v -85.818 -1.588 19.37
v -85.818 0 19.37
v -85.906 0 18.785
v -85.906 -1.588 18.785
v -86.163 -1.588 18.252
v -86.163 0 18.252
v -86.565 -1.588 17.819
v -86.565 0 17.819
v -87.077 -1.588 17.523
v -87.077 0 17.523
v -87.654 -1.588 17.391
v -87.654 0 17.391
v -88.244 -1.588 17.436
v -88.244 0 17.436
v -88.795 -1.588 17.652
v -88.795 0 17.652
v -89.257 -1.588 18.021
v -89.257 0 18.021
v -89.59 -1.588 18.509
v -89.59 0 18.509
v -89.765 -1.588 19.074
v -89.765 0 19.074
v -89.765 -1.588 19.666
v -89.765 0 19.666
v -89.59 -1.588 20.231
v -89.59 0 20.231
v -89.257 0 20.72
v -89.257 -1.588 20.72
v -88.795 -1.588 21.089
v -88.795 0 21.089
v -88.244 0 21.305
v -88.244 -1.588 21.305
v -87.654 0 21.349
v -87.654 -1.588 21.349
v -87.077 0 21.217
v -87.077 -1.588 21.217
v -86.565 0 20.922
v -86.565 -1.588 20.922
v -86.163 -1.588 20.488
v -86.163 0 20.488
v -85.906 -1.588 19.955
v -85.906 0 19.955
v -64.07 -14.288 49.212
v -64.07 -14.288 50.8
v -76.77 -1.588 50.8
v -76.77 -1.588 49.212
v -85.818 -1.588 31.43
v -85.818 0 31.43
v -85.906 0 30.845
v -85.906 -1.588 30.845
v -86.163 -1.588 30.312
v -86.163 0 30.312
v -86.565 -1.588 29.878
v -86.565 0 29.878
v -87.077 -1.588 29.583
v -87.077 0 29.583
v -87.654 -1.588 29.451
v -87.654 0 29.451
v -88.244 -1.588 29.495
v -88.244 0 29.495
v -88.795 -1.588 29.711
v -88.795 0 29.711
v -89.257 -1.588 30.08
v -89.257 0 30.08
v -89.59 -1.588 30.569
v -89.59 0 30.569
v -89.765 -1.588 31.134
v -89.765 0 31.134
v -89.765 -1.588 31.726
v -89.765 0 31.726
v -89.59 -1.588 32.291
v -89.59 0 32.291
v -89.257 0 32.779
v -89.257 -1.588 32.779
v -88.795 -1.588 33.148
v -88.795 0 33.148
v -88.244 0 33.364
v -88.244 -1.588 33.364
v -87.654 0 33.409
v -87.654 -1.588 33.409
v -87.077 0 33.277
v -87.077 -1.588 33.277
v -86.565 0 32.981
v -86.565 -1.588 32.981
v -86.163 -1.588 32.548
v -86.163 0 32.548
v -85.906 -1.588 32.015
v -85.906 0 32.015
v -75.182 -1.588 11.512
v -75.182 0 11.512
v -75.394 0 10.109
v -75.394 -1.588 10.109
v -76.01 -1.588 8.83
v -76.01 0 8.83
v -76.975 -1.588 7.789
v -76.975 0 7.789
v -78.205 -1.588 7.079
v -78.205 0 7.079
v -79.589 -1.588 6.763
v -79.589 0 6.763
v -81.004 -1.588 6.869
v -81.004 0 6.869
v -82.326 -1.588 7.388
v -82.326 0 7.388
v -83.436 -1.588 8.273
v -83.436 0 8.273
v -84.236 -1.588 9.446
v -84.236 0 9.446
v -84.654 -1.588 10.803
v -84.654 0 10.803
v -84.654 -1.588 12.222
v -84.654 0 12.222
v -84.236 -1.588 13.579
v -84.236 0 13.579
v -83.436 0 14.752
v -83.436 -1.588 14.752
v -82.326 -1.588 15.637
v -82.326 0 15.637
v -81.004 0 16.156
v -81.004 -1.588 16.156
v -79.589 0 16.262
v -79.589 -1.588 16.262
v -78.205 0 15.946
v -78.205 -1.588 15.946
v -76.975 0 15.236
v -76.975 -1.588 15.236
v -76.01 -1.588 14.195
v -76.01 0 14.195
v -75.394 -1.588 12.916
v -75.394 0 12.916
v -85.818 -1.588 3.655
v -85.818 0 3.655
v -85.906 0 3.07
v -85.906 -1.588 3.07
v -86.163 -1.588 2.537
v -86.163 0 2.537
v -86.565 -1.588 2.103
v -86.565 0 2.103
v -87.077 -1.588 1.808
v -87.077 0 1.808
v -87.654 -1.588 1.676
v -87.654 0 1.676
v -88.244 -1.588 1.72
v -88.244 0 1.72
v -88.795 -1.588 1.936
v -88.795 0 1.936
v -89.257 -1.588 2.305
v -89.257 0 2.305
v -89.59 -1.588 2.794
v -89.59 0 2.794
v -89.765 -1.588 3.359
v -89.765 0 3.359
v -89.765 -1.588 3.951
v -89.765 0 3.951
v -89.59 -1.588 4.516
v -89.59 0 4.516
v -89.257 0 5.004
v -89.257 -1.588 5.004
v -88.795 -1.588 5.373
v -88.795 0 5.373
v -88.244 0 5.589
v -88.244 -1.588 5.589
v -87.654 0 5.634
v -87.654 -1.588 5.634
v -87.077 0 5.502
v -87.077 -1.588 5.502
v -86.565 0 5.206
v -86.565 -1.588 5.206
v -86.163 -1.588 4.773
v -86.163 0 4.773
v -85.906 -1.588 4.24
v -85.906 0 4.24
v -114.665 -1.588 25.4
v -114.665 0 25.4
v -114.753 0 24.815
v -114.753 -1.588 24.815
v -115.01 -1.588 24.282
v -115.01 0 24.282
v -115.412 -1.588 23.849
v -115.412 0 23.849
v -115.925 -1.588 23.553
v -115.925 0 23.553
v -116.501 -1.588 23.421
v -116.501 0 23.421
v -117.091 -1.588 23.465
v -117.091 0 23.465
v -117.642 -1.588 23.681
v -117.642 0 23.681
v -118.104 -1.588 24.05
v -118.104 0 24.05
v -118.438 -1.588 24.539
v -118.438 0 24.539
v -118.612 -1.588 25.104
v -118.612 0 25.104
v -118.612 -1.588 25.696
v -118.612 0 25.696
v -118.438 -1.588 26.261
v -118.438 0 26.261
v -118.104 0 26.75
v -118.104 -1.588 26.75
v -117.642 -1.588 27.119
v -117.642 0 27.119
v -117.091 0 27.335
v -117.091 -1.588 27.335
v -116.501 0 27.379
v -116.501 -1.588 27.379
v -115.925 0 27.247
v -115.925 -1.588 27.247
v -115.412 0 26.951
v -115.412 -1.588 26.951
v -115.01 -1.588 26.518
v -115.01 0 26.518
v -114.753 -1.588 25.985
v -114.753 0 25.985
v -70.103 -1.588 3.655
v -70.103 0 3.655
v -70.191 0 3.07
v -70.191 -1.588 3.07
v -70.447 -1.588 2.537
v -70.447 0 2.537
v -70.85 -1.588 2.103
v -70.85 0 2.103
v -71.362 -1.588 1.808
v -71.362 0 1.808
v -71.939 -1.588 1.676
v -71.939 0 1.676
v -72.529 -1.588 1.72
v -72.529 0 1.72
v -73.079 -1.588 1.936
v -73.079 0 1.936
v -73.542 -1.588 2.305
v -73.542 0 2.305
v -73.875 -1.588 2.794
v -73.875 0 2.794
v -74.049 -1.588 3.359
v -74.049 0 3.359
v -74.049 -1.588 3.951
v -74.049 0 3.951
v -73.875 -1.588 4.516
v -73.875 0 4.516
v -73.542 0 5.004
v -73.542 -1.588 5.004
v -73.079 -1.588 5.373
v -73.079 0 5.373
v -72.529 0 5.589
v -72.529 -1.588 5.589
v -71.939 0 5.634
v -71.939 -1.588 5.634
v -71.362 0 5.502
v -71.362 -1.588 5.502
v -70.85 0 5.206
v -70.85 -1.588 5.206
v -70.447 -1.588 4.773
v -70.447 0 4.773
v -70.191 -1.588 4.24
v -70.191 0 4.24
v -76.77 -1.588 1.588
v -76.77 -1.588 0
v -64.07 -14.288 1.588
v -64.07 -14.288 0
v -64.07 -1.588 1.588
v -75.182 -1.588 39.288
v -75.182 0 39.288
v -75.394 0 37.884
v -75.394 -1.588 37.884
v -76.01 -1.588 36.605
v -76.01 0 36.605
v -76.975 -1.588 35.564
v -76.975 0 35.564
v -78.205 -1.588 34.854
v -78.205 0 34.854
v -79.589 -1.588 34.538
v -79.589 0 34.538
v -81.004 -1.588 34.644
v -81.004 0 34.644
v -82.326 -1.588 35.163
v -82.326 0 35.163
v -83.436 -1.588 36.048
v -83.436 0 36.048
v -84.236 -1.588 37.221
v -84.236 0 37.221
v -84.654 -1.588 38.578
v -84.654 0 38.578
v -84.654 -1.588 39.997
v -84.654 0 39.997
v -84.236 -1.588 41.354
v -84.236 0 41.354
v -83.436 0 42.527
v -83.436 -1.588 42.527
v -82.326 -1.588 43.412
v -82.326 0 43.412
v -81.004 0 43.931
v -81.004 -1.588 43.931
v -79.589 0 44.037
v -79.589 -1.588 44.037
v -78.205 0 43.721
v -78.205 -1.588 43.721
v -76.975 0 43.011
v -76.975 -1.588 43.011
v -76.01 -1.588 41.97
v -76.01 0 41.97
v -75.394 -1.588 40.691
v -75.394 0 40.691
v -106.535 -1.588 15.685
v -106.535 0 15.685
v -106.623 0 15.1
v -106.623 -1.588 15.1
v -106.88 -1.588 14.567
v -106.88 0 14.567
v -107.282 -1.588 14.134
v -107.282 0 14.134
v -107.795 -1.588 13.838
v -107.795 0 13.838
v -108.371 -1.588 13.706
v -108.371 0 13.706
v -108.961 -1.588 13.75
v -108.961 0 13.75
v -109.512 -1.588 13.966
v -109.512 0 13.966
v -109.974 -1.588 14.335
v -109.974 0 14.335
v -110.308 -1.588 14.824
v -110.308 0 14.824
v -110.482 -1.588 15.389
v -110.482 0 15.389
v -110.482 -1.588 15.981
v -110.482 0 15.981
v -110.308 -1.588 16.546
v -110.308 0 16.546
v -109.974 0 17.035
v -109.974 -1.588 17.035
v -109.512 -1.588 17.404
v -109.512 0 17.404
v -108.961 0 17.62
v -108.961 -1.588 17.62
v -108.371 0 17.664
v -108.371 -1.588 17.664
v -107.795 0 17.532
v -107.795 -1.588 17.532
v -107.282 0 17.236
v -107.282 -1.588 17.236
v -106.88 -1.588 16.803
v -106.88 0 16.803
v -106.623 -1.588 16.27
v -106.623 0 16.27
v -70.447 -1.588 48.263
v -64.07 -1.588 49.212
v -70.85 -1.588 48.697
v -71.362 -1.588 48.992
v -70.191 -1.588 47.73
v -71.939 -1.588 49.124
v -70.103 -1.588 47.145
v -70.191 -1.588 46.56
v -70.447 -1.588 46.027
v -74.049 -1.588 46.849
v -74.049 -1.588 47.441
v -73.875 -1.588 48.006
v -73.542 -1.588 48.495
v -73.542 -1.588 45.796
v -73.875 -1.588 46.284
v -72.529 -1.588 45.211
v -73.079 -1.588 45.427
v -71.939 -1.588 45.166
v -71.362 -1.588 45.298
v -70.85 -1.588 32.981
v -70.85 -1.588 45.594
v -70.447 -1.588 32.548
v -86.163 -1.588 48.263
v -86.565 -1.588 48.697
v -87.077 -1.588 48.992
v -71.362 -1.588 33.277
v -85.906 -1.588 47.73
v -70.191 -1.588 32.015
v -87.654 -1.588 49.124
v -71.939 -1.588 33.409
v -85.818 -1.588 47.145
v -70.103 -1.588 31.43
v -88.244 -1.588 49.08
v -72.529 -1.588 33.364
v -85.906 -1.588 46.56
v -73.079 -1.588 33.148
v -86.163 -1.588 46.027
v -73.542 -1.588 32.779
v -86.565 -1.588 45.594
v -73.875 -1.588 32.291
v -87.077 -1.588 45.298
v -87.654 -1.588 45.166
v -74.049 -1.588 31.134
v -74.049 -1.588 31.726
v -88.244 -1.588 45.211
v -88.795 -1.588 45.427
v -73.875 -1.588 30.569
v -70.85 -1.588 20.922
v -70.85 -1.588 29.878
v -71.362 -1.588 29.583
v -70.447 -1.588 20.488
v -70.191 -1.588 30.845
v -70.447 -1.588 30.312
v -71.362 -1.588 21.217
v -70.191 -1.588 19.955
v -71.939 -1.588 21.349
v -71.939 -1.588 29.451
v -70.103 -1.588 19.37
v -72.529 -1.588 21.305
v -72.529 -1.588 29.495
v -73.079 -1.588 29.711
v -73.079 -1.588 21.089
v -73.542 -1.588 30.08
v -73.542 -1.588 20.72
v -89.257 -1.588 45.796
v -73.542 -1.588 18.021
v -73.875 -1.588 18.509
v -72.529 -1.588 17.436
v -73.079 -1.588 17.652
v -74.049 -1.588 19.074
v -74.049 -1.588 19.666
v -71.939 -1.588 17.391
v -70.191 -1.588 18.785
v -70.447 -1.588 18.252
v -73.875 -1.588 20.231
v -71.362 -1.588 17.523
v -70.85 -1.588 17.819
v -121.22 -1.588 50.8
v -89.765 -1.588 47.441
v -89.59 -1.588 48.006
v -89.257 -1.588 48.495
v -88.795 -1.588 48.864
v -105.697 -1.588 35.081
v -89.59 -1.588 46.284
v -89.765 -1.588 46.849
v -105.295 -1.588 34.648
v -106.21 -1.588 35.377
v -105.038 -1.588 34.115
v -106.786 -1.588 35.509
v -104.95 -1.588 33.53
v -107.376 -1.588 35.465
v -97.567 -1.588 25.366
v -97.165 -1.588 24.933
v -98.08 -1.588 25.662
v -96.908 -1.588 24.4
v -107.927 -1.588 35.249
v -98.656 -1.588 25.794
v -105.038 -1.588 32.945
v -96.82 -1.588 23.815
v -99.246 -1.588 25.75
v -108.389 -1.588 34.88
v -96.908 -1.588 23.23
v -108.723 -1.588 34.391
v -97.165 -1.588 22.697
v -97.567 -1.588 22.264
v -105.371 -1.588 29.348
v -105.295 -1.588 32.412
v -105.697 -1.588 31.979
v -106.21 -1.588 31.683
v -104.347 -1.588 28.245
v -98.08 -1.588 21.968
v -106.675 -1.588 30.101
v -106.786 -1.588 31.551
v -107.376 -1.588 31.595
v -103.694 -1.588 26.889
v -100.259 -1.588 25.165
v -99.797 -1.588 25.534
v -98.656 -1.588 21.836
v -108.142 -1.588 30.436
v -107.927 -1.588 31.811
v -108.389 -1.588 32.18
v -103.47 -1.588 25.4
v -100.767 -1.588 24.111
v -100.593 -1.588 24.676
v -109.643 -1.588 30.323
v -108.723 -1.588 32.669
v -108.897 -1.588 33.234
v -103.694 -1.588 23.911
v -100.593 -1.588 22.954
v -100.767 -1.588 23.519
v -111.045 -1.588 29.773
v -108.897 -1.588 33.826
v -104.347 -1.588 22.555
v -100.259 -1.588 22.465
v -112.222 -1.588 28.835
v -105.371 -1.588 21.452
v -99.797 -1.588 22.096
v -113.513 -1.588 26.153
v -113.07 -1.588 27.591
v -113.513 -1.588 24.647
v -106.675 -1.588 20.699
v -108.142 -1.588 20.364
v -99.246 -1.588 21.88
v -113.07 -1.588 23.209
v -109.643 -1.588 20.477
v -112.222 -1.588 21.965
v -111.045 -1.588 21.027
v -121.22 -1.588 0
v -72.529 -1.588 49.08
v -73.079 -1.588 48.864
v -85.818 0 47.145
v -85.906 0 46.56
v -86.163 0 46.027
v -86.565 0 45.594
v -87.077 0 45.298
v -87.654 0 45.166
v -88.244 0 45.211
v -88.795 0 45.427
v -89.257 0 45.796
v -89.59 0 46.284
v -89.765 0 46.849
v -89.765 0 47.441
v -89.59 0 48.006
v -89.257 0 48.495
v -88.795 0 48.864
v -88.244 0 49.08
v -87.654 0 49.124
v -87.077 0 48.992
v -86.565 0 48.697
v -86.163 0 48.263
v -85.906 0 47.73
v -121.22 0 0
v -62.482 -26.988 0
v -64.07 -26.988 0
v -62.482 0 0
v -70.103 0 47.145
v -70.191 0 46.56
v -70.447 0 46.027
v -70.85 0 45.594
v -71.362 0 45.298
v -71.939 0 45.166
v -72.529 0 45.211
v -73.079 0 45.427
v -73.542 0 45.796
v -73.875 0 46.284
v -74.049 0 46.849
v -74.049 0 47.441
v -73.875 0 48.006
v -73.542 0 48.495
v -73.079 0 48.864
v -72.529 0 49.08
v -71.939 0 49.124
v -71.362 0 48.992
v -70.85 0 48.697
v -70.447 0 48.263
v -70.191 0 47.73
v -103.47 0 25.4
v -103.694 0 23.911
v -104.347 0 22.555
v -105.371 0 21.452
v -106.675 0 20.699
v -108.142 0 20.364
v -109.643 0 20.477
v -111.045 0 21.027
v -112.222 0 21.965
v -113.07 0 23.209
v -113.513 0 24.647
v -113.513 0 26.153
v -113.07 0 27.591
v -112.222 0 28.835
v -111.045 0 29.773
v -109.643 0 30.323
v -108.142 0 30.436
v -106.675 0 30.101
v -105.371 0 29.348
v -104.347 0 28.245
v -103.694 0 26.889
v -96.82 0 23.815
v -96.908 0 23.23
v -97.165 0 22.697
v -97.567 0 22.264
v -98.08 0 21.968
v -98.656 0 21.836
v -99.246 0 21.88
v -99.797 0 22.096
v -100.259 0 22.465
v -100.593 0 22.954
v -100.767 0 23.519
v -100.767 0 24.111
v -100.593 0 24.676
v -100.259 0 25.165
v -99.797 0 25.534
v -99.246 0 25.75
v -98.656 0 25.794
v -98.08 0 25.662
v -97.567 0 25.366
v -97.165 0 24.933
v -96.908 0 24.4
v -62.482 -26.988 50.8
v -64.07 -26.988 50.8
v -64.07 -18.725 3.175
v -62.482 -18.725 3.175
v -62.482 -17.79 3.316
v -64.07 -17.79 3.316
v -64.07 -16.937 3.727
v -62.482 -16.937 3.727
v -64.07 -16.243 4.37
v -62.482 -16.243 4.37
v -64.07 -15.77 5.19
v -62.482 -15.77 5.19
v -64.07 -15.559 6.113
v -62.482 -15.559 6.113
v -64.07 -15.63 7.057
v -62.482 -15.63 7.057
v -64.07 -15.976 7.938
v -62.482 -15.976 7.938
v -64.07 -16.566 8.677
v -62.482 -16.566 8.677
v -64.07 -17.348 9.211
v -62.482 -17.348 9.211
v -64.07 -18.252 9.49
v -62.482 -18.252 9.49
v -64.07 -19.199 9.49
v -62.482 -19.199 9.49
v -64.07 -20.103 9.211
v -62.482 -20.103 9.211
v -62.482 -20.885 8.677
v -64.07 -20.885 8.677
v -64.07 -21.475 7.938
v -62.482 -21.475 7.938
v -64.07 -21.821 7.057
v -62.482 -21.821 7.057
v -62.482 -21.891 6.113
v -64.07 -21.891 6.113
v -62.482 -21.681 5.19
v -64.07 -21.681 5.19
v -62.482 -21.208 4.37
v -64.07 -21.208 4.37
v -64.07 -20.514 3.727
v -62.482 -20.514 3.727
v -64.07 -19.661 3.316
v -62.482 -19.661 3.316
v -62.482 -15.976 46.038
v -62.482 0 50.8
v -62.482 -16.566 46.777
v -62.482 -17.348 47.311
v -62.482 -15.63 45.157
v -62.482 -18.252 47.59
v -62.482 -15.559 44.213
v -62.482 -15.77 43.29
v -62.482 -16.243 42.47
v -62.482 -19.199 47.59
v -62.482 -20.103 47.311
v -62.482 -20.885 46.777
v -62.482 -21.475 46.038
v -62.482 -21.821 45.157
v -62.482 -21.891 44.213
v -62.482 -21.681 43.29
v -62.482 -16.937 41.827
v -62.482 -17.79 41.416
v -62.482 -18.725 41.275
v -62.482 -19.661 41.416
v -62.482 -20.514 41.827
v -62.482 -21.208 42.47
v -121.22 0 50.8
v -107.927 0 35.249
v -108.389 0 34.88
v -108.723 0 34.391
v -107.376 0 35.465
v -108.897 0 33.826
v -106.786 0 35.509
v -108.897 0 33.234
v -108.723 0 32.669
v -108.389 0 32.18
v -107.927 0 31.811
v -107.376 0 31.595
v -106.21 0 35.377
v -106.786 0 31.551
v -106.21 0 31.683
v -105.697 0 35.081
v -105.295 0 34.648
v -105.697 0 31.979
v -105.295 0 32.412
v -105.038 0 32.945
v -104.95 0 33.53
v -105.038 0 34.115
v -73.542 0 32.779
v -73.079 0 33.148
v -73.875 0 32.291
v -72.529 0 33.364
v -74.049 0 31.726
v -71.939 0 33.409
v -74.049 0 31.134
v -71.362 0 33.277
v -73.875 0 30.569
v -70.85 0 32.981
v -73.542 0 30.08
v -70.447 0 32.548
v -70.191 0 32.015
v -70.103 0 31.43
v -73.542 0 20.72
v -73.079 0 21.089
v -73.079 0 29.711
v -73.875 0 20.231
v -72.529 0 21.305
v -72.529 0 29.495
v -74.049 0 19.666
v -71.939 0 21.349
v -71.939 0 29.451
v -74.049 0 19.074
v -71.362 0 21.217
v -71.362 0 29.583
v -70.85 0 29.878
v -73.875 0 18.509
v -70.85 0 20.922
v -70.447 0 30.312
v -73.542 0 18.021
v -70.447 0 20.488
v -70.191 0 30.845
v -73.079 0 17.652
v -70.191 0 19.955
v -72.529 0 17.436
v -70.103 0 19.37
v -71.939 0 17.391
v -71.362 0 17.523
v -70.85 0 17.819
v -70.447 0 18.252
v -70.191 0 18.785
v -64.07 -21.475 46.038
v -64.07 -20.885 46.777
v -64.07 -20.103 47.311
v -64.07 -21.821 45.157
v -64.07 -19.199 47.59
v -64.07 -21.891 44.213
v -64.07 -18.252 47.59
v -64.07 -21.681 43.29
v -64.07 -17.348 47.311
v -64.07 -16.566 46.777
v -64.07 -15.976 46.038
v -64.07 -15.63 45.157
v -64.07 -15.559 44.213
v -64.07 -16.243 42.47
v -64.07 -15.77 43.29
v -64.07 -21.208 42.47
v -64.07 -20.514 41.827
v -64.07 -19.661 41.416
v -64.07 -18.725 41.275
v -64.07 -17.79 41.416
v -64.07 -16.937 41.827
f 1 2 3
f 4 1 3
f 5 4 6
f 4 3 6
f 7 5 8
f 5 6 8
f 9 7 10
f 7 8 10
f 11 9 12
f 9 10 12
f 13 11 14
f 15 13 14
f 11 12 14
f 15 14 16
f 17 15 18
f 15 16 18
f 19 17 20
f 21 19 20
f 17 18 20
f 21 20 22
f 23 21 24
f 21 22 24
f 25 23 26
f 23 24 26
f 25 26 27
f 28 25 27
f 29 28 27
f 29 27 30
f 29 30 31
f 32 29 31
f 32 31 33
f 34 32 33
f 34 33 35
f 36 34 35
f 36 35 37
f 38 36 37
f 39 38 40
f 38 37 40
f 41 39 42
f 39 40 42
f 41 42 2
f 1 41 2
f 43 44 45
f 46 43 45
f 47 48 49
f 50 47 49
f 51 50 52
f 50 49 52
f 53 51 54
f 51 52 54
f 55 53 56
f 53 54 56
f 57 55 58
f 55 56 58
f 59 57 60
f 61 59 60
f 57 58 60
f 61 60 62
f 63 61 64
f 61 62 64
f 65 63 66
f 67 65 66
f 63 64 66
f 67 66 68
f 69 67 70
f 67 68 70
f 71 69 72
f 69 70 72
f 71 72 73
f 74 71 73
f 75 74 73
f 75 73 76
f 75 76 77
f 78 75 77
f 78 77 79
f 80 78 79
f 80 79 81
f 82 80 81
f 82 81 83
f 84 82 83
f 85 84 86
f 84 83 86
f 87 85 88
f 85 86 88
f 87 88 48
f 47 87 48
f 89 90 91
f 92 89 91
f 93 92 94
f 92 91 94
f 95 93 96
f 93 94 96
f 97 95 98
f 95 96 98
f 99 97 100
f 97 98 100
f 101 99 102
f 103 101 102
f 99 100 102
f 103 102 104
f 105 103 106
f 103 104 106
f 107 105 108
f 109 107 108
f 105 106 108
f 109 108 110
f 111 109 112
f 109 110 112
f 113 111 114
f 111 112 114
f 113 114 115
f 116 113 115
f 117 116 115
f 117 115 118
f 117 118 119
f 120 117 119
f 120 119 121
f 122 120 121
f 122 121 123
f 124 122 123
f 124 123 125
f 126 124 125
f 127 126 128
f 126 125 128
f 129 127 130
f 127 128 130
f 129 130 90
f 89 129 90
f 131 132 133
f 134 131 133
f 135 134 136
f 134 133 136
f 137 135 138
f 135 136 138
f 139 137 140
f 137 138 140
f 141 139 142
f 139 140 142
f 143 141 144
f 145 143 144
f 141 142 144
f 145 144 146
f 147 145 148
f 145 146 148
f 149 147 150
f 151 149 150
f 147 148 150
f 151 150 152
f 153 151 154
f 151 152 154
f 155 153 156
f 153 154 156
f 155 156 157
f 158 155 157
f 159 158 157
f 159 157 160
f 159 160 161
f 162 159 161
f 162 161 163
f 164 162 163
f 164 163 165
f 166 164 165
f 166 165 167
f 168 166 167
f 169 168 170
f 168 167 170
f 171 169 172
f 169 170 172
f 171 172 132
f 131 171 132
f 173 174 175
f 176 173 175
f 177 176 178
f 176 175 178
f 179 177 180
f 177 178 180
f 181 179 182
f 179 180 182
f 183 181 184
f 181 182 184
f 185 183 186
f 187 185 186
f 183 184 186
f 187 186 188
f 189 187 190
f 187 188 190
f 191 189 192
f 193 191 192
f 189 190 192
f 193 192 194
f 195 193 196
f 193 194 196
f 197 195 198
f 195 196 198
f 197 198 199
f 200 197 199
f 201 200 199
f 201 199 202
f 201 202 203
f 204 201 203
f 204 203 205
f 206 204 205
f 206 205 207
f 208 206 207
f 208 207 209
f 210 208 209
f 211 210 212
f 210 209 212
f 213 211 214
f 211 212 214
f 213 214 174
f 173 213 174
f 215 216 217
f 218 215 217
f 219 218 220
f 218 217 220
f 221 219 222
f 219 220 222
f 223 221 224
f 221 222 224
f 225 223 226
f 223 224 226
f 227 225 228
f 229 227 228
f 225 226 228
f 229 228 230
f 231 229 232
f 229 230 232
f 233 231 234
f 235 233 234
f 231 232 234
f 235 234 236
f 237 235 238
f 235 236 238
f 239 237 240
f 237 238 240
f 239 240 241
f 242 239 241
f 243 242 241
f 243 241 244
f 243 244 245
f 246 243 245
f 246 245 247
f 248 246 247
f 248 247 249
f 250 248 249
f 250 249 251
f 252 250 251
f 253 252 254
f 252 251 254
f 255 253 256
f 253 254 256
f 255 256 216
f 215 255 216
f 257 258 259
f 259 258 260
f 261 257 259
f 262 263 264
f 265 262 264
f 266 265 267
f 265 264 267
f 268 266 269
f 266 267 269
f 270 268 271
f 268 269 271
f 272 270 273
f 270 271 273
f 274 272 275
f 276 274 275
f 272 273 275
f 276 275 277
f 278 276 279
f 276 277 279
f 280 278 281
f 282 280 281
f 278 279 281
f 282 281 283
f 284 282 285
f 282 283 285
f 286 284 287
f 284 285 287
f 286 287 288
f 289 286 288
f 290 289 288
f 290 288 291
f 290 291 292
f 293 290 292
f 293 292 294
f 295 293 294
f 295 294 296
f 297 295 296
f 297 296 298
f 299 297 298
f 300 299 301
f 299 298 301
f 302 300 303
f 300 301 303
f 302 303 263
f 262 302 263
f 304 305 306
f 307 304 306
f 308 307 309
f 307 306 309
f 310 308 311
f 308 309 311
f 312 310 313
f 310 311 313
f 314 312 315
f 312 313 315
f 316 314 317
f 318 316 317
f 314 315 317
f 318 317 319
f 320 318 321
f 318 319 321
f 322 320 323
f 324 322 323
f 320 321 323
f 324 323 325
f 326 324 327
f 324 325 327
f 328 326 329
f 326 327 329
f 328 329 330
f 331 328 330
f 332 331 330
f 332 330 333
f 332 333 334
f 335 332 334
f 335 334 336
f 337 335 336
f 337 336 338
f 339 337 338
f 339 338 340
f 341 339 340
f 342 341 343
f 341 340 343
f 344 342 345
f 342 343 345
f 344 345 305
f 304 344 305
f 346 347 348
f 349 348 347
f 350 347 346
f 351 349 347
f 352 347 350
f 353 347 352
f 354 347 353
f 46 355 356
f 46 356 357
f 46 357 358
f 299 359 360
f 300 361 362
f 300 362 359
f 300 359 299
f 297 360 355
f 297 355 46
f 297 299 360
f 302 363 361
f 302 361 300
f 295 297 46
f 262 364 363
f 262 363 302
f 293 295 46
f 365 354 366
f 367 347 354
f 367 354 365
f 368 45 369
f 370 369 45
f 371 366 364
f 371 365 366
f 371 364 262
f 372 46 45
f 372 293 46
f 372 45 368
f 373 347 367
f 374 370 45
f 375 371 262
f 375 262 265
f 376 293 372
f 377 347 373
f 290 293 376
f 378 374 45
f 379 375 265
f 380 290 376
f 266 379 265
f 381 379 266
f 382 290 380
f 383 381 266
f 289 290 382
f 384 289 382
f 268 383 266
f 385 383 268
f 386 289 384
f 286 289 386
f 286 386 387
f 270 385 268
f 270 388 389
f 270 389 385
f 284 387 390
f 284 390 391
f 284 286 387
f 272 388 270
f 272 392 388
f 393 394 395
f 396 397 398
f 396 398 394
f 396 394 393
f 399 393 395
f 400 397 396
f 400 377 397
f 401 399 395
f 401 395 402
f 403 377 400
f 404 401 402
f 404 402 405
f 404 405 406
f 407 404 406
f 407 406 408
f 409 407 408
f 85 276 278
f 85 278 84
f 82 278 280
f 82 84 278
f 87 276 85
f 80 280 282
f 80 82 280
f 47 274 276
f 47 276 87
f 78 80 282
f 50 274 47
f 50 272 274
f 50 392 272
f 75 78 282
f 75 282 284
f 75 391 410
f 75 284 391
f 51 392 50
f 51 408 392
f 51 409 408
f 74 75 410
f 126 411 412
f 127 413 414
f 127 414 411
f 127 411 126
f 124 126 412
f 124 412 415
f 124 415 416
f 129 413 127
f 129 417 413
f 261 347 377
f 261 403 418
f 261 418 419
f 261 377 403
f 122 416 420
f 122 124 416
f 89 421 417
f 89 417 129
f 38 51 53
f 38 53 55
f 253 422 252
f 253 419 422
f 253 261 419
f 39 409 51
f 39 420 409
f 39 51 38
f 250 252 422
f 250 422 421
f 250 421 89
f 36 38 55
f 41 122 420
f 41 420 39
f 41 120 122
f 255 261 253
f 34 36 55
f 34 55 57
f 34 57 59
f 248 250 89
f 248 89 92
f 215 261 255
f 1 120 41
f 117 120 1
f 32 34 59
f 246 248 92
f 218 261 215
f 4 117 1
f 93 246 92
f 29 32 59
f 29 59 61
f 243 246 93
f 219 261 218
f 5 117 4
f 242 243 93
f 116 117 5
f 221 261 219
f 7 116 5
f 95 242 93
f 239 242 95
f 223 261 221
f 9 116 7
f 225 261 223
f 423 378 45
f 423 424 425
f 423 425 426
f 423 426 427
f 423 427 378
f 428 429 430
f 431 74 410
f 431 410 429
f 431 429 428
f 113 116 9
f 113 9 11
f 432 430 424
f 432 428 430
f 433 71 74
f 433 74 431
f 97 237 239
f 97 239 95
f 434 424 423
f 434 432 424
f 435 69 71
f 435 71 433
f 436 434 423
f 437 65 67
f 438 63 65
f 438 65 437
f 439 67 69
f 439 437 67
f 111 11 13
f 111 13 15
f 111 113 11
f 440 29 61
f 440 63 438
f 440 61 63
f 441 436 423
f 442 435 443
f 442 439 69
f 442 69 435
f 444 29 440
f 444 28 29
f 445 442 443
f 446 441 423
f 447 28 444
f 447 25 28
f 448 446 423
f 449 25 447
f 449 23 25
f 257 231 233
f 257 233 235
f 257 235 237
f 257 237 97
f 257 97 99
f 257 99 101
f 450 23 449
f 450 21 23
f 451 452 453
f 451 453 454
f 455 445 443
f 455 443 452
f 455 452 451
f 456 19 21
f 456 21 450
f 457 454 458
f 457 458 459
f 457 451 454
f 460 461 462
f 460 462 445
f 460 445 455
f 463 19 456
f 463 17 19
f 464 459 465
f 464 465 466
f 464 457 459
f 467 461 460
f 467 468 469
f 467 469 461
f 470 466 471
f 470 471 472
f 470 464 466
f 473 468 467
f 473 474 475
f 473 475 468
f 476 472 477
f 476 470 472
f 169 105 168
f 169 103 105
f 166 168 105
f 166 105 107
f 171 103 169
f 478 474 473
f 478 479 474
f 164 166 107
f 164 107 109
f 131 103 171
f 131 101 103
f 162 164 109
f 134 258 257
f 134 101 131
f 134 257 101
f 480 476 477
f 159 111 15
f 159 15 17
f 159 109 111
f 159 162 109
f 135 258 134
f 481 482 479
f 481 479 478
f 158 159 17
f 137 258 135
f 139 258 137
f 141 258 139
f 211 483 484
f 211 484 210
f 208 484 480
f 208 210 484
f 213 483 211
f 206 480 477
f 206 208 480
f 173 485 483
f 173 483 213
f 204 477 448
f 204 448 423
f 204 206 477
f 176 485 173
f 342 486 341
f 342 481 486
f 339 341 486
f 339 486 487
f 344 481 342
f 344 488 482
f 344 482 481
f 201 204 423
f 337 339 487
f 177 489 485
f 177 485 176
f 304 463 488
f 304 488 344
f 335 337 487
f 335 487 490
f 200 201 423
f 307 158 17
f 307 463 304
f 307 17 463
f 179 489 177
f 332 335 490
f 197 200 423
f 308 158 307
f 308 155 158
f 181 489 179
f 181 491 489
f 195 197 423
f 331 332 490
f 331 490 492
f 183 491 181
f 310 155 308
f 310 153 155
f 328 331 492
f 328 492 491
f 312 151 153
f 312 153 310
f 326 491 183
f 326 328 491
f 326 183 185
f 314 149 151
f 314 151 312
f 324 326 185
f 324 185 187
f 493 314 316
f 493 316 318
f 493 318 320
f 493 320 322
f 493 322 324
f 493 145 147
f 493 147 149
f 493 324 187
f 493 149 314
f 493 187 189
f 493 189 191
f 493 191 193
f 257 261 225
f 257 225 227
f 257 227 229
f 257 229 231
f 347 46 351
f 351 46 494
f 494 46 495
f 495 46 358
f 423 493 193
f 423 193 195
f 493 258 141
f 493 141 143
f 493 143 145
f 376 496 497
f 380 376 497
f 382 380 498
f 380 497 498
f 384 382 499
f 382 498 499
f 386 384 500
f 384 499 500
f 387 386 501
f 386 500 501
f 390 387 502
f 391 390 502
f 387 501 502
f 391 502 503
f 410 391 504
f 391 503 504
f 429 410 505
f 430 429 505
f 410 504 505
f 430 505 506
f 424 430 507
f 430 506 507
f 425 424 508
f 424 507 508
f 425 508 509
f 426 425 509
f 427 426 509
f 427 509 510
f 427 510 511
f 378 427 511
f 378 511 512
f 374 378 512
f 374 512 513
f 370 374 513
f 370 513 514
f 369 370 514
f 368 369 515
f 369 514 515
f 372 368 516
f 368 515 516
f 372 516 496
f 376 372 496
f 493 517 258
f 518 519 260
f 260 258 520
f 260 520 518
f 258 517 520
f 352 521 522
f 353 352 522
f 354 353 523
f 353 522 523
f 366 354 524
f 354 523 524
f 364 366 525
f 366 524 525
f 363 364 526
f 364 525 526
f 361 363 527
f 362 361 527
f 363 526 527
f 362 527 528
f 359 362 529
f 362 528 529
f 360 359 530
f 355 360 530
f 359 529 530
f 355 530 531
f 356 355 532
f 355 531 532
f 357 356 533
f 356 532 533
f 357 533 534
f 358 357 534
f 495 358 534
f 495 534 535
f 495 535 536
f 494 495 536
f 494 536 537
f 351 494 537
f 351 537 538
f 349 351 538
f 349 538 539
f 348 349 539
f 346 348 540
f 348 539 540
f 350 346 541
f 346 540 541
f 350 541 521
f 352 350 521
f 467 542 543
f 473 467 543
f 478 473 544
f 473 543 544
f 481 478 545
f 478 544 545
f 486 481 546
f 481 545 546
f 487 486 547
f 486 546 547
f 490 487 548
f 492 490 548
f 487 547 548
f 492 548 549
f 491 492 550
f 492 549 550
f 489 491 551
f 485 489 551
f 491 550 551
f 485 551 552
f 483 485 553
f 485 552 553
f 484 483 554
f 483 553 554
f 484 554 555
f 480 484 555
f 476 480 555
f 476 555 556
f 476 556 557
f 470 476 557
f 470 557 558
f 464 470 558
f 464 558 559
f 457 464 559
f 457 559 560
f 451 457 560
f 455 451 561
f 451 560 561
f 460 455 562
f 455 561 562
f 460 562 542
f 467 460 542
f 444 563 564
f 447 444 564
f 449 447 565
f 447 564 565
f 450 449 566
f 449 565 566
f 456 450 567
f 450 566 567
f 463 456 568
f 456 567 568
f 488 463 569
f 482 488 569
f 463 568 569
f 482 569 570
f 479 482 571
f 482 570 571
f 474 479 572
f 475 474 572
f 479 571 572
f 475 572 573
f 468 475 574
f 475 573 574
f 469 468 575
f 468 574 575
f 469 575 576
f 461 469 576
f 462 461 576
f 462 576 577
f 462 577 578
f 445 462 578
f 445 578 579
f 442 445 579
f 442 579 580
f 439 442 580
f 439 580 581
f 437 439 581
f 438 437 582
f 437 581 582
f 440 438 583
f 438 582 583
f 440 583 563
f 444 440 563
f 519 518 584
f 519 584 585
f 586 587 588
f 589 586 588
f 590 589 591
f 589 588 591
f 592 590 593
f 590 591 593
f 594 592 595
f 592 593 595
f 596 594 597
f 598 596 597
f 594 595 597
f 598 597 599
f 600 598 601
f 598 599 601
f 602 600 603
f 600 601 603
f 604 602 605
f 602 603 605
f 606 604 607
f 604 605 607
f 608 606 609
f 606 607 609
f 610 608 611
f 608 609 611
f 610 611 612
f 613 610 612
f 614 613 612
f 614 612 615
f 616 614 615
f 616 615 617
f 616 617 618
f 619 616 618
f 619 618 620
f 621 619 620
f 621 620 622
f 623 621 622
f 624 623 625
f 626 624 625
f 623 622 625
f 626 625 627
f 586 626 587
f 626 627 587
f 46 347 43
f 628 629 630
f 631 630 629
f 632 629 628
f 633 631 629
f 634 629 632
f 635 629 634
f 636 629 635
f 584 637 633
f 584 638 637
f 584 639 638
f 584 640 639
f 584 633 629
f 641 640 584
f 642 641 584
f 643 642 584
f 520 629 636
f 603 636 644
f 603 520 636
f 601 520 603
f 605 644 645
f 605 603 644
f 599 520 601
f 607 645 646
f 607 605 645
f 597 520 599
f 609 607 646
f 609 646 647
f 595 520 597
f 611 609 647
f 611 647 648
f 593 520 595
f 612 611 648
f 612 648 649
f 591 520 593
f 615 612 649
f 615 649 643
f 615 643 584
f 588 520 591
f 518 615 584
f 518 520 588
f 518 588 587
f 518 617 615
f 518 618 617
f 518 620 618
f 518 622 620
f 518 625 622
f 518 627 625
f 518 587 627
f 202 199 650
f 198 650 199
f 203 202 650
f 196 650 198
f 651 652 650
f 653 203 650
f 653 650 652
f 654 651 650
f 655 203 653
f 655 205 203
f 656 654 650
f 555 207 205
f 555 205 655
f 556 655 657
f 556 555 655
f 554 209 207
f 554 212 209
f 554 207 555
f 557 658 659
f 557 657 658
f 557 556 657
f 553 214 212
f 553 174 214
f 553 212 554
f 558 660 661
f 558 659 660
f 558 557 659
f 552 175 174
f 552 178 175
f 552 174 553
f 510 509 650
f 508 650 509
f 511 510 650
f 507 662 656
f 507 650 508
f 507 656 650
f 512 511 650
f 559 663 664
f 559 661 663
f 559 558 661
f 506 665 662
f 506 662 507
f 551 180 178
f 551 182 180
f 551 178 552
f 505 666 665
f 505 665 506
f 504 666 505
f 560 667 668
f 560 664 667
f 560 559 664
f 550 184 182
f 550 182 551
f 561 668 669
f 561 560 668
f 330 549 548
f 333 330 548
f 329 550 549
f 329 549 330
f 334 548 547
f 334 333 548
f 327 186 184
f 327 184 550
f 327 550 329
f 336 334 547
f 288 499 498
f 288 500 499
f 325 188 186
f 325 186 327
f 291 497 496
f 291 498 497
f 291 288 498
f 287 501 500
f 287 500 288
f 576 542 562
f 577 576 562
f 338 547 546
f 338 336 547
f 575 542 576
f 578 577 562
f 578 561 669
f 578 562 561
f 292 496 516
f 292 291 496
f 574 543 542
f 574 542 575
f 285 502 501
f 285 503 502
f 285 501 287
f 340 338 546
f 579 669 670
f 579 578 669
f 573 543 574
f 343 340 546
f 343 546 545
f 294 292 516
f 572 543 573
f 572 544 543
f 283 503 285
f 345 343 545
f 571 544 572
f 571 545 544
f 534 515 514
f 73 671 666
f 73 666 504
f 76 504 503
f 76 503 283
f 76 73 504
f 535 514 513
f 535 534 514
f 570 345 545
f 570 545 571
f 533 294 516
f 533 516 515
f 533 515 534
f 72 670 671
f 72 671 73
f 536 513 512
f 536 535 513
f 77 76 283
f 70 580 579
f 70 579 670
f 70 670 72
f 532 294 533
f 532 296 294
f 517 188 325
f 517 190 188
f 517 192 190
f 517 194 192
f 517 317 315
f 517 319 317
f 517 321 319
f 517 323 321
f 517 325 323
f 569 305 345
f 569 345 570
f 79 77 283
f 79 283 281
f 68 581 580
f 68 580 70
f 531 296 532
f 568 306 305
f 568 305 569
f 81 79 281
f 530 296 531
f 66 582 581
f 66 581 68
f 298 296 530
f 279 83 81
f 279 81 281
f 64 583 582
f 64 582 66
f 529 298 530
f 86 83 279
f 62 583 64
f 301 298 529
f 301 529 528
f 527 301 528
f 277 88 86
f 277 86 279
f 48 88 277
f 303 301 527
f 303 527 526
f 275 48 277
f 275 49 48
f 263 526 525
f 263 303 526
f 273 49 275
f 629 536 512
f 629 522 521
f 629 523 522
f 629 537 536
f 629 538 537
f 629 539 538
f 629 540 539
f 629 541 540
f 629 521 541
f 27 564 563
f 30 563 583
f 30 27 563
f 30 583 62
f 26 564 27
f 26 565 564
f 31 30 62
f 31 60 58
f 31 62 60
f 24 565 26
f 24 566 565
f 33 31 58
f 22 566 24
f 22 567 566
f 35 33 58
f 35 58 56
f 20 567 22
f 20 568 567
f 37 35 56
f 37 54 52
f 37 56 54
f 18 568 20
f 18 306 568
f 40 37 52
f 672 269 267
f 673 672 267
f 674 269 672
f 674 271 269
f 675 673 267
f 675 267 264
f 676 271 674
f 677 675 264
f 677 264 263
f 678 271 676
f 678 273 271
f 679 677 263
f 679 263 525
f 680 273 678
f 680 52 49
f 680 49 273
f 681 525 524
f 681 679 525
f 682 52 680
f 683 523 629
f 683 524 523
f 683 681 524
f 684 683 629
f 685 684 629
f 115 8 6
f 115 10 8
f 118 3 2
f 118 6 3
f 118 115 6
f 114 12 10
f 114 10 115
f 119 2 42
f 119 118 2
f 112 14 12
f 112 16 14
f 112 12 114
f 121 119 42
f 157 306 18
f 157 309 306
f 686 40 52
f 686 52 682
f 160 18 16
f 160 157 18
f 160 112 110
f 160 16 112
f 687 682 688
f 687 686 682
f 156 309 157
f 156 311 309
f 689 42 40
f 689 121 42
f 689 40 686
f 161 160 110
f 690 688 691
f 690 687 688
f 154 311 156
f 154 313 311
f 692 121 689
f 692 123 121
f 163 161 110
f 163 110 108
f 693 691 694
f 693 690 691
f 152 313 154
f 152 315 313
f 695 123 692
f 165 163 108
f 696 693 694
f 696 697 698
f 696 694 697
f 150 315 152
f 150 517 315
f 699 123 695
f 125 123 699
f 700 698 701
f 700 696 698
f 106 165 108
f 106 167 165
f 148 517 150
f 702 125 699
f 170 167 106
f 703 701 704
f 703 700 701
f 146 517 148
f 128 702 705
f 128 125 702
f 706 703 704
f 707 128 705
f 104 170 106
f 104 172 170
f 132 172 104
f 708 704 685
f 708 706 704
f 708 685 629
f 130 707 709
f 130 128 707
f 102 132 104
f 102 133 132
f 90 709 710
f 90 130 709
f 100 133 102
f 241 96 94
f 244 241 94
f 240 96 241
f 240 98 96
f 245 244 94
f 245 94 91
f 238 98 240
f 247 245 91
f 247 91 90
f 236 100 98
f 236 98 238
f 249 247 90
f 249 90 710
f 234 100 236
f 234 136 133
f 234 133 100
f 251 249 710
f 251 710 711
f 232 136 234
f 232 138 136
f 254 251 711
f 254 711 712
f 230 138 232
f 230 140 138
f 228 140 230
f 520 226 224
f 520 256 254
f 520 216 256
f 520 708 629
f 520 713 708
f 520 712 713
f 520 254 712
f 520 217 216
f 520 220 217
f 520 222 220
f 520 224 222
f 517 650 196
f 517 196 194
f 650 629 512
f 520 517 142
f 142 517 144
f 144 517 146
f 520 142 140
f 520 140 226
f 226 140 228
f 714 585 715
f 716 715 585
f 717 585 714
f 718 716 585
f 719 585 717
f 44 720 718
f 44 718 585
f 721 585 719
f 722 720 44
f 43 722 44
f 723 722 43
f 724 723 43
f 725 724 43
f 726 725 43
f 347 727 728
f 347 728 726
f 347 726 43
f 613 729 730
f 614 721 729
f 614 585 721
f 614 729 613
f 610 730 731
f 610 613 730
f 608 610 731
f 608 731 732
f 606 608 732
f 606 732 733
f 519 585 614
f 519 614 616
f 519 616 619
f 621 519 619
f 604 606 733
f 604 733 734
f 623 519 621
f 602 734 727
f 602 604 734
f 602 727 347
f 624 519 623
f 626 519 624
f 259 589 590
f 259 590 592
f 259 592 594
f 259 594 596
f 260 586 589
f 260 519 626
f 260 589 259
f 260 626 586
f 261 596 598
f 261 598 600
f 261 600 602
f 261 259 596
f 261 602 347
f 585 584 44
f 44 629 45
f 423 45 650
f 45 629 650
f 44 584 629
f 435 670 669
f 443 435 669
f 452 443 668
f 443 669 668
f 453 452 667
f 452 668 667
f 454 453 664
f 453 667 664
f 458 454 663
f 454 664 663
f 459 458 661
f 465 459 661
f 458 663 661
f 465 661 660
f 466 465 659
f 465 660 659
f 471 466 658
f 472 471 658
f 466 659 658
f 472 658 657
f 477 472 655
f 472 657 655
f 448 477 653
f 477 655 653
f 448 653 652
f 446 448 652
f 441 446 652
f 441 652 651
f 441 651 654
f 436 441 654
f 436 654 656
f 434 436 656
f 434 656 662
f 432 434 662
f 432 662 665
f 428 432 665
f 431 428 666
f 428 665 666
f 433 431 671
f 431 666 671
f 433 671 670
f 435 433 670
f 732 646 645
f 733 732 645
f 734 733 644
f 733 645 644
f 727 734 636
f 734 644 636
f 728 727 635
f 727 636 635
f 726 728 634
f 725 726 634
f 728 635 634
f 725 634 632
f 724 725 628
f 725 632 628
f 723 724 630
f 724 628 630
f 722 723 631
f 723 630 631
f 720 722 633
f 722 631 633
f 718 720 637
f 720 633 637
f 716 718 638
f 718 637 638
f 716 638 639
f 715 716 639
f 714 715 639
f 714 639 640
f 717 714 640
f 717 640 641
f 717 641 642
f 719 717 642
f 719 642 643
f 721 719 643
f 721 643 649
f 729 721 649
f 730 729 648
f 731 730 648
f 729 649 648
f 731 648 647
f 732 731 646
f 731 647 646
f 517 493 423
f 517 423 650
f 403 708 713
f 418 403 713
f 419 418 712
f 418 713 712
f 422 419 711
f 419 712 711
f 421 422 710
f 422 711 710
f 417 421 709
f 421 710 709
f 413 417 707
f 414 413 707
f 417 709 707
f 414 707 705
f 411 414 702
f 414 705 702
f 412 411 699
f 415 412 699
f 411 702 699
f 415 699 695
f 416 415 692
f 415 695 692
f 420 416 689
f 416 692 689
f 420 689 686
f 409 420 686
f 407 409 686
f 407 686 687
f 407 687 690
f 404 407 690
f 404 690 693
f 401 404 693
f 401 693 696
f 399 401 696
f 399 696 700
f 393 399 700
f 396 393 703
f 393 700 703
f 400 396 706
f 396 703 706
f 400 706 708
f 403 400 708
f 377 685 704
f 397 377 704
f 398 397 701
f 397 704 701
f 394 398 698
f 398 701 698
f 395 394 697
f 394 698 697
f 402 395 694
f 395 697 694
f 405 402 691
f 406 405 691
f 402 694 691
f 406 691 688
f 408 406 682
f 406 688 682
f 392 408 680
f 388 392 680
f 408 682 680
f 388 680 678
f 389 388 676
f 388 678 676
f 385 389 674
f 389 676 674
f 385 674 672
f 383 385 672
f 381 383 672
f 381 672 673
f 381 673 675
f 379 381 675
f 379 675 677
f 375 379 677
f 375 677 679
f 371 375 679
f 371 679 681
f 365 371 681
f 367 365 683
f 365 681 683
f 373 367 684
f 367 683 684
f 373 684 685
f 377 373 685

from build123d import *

# Parameters (mm, degrees)
BOSS_EXTRUDE2_DEPTH = 50.8
SKETCH4_R           = 5.05
SKETCH4_R_2         = 4.7625
SKETCH4_R_3         = 1.984375
CUT_EXTRUDE1_DEPTH  = 1.5875
BOSS_EXTRUDE3_DEPTH = 1.5875
BOSS_EXTRUDE4_DEPTH = 1.5875
SKETCH8_R           = 3.175
CUT_EXTRUDE2_DEPTH  = 1.5875


with BuildPart() as part:
    # Sketch3 → Boss-Extrude2 (new body)
    with BuildSketch(Plane.XY):
        Polygon((-121.219673345, 0), (-62.482173345, 0), (-62.482173345, -26.9875), (-64.069673345, -26.9875), (-64.069673345, -1.5875), (-121.219673345, -1.5875), align=None)
    extrude(amount=BOSS_EXTRUDE2_DEPTH)

    # Sketch4 → Cut-Extrude1 (cut)
    with BuildSketch(Plane(origin=(0, 0, 0), x_dir=(1, 0, 0), z_dir=(0, 1, 0))):
        with Locations((-108.519673345, -25.4)):
            Circle(SKETCH4_R)
        with Locations((-79.944673345, -39.2875)):
            Circle(SKETCH4_R_2)
        with Locations((-108.519673345, -15.685)):
            Circle(SKETCH4_R_3)
        with Locations((-87.802397451, -31.429775894)):
            Circle(SKETCH4_R_3)
        with Locations((-72.086949239, -31.429775894)):
            Circle(SKETCH4_R_3)
        with Locations((-72.086949239, -47.145224106)):
            Circle(SKETCH4_R_3)
        with Locations((-87.802397451, -47.145224106)):
            Circle(SKETCH4_R_3)
        with Locations((-116.649673345, -25.4)):
            Circle(SKETCH4_R_3)
        with Locations((-98.804673345, -23.815)):
            Circle(SKETCH4_R_3)
        with Locations((-106.934673345, -33.53)):
            Circle(SKETCH4_R_3)
        with Locations((-87.802397451, -3.654775894)):
            Circle(SKETCH4_R_3)
        with Locations((-72.086949239, -3.654775894)):
            Circle(SKETCH4_R_3)
        with Locations((-72.086949239, -19.370224106)):
            Circle(SKETCH4_R_3)
        with Locations((-87.802397451, -19.370224106)):
            Circle(SKETCH4_R_3)
        with Locations((-79.944673345, -11.5125)):
            Circle(SKETCH4_R_2)
    extrude(amount=-CUT_EXTRUDE1_DEPTH, mode=Mode.SUBTRACT)

    # Sketch5 → Boss-Extrude3 (add)
    with BuildSketch(Plane(origin=(0, 0, 0), x_dir=(-1, 0, 0), z_dir=(0, 0, -1))):
        Polygon((76.769673345, -1.5875), (64.069673345, -14.2875), (64.069673345, -1.5875), align=None)
    extrude(amount=-BOSS_EXTRUDE3_DEPTH)

    # Sketch7 → Boss-Extrude4 (add)
    with BuildSketch(Plane.XY.offset(50.8)):
        Polygon((-64.069673345, -1.5875), (-64.069673345, -14.2875), (-76.769673345, -1.5875), align=None)
    extrude(amount=-BOSS_EXTRUDE4_DEPTH)

    # Sketch8 → Cut-Extrude2 (cut)
    with BuildSketch(Plane(origin=(-62.482173345, 0, 0), x_dir=(0, 0, -1), z_dir=(1, 0, 0))):
        with Locations((-44.45, -18.725361779)):
            Circle(SKETCH8_R)
        with Locations((-6.35, -18.725361779)):
            Circle(SKETCH8_R)
    extrude(amount=-CUT_EXTRUDE2_DEPTH, mode=Mode.SUBTRACT)


solid = part.part
